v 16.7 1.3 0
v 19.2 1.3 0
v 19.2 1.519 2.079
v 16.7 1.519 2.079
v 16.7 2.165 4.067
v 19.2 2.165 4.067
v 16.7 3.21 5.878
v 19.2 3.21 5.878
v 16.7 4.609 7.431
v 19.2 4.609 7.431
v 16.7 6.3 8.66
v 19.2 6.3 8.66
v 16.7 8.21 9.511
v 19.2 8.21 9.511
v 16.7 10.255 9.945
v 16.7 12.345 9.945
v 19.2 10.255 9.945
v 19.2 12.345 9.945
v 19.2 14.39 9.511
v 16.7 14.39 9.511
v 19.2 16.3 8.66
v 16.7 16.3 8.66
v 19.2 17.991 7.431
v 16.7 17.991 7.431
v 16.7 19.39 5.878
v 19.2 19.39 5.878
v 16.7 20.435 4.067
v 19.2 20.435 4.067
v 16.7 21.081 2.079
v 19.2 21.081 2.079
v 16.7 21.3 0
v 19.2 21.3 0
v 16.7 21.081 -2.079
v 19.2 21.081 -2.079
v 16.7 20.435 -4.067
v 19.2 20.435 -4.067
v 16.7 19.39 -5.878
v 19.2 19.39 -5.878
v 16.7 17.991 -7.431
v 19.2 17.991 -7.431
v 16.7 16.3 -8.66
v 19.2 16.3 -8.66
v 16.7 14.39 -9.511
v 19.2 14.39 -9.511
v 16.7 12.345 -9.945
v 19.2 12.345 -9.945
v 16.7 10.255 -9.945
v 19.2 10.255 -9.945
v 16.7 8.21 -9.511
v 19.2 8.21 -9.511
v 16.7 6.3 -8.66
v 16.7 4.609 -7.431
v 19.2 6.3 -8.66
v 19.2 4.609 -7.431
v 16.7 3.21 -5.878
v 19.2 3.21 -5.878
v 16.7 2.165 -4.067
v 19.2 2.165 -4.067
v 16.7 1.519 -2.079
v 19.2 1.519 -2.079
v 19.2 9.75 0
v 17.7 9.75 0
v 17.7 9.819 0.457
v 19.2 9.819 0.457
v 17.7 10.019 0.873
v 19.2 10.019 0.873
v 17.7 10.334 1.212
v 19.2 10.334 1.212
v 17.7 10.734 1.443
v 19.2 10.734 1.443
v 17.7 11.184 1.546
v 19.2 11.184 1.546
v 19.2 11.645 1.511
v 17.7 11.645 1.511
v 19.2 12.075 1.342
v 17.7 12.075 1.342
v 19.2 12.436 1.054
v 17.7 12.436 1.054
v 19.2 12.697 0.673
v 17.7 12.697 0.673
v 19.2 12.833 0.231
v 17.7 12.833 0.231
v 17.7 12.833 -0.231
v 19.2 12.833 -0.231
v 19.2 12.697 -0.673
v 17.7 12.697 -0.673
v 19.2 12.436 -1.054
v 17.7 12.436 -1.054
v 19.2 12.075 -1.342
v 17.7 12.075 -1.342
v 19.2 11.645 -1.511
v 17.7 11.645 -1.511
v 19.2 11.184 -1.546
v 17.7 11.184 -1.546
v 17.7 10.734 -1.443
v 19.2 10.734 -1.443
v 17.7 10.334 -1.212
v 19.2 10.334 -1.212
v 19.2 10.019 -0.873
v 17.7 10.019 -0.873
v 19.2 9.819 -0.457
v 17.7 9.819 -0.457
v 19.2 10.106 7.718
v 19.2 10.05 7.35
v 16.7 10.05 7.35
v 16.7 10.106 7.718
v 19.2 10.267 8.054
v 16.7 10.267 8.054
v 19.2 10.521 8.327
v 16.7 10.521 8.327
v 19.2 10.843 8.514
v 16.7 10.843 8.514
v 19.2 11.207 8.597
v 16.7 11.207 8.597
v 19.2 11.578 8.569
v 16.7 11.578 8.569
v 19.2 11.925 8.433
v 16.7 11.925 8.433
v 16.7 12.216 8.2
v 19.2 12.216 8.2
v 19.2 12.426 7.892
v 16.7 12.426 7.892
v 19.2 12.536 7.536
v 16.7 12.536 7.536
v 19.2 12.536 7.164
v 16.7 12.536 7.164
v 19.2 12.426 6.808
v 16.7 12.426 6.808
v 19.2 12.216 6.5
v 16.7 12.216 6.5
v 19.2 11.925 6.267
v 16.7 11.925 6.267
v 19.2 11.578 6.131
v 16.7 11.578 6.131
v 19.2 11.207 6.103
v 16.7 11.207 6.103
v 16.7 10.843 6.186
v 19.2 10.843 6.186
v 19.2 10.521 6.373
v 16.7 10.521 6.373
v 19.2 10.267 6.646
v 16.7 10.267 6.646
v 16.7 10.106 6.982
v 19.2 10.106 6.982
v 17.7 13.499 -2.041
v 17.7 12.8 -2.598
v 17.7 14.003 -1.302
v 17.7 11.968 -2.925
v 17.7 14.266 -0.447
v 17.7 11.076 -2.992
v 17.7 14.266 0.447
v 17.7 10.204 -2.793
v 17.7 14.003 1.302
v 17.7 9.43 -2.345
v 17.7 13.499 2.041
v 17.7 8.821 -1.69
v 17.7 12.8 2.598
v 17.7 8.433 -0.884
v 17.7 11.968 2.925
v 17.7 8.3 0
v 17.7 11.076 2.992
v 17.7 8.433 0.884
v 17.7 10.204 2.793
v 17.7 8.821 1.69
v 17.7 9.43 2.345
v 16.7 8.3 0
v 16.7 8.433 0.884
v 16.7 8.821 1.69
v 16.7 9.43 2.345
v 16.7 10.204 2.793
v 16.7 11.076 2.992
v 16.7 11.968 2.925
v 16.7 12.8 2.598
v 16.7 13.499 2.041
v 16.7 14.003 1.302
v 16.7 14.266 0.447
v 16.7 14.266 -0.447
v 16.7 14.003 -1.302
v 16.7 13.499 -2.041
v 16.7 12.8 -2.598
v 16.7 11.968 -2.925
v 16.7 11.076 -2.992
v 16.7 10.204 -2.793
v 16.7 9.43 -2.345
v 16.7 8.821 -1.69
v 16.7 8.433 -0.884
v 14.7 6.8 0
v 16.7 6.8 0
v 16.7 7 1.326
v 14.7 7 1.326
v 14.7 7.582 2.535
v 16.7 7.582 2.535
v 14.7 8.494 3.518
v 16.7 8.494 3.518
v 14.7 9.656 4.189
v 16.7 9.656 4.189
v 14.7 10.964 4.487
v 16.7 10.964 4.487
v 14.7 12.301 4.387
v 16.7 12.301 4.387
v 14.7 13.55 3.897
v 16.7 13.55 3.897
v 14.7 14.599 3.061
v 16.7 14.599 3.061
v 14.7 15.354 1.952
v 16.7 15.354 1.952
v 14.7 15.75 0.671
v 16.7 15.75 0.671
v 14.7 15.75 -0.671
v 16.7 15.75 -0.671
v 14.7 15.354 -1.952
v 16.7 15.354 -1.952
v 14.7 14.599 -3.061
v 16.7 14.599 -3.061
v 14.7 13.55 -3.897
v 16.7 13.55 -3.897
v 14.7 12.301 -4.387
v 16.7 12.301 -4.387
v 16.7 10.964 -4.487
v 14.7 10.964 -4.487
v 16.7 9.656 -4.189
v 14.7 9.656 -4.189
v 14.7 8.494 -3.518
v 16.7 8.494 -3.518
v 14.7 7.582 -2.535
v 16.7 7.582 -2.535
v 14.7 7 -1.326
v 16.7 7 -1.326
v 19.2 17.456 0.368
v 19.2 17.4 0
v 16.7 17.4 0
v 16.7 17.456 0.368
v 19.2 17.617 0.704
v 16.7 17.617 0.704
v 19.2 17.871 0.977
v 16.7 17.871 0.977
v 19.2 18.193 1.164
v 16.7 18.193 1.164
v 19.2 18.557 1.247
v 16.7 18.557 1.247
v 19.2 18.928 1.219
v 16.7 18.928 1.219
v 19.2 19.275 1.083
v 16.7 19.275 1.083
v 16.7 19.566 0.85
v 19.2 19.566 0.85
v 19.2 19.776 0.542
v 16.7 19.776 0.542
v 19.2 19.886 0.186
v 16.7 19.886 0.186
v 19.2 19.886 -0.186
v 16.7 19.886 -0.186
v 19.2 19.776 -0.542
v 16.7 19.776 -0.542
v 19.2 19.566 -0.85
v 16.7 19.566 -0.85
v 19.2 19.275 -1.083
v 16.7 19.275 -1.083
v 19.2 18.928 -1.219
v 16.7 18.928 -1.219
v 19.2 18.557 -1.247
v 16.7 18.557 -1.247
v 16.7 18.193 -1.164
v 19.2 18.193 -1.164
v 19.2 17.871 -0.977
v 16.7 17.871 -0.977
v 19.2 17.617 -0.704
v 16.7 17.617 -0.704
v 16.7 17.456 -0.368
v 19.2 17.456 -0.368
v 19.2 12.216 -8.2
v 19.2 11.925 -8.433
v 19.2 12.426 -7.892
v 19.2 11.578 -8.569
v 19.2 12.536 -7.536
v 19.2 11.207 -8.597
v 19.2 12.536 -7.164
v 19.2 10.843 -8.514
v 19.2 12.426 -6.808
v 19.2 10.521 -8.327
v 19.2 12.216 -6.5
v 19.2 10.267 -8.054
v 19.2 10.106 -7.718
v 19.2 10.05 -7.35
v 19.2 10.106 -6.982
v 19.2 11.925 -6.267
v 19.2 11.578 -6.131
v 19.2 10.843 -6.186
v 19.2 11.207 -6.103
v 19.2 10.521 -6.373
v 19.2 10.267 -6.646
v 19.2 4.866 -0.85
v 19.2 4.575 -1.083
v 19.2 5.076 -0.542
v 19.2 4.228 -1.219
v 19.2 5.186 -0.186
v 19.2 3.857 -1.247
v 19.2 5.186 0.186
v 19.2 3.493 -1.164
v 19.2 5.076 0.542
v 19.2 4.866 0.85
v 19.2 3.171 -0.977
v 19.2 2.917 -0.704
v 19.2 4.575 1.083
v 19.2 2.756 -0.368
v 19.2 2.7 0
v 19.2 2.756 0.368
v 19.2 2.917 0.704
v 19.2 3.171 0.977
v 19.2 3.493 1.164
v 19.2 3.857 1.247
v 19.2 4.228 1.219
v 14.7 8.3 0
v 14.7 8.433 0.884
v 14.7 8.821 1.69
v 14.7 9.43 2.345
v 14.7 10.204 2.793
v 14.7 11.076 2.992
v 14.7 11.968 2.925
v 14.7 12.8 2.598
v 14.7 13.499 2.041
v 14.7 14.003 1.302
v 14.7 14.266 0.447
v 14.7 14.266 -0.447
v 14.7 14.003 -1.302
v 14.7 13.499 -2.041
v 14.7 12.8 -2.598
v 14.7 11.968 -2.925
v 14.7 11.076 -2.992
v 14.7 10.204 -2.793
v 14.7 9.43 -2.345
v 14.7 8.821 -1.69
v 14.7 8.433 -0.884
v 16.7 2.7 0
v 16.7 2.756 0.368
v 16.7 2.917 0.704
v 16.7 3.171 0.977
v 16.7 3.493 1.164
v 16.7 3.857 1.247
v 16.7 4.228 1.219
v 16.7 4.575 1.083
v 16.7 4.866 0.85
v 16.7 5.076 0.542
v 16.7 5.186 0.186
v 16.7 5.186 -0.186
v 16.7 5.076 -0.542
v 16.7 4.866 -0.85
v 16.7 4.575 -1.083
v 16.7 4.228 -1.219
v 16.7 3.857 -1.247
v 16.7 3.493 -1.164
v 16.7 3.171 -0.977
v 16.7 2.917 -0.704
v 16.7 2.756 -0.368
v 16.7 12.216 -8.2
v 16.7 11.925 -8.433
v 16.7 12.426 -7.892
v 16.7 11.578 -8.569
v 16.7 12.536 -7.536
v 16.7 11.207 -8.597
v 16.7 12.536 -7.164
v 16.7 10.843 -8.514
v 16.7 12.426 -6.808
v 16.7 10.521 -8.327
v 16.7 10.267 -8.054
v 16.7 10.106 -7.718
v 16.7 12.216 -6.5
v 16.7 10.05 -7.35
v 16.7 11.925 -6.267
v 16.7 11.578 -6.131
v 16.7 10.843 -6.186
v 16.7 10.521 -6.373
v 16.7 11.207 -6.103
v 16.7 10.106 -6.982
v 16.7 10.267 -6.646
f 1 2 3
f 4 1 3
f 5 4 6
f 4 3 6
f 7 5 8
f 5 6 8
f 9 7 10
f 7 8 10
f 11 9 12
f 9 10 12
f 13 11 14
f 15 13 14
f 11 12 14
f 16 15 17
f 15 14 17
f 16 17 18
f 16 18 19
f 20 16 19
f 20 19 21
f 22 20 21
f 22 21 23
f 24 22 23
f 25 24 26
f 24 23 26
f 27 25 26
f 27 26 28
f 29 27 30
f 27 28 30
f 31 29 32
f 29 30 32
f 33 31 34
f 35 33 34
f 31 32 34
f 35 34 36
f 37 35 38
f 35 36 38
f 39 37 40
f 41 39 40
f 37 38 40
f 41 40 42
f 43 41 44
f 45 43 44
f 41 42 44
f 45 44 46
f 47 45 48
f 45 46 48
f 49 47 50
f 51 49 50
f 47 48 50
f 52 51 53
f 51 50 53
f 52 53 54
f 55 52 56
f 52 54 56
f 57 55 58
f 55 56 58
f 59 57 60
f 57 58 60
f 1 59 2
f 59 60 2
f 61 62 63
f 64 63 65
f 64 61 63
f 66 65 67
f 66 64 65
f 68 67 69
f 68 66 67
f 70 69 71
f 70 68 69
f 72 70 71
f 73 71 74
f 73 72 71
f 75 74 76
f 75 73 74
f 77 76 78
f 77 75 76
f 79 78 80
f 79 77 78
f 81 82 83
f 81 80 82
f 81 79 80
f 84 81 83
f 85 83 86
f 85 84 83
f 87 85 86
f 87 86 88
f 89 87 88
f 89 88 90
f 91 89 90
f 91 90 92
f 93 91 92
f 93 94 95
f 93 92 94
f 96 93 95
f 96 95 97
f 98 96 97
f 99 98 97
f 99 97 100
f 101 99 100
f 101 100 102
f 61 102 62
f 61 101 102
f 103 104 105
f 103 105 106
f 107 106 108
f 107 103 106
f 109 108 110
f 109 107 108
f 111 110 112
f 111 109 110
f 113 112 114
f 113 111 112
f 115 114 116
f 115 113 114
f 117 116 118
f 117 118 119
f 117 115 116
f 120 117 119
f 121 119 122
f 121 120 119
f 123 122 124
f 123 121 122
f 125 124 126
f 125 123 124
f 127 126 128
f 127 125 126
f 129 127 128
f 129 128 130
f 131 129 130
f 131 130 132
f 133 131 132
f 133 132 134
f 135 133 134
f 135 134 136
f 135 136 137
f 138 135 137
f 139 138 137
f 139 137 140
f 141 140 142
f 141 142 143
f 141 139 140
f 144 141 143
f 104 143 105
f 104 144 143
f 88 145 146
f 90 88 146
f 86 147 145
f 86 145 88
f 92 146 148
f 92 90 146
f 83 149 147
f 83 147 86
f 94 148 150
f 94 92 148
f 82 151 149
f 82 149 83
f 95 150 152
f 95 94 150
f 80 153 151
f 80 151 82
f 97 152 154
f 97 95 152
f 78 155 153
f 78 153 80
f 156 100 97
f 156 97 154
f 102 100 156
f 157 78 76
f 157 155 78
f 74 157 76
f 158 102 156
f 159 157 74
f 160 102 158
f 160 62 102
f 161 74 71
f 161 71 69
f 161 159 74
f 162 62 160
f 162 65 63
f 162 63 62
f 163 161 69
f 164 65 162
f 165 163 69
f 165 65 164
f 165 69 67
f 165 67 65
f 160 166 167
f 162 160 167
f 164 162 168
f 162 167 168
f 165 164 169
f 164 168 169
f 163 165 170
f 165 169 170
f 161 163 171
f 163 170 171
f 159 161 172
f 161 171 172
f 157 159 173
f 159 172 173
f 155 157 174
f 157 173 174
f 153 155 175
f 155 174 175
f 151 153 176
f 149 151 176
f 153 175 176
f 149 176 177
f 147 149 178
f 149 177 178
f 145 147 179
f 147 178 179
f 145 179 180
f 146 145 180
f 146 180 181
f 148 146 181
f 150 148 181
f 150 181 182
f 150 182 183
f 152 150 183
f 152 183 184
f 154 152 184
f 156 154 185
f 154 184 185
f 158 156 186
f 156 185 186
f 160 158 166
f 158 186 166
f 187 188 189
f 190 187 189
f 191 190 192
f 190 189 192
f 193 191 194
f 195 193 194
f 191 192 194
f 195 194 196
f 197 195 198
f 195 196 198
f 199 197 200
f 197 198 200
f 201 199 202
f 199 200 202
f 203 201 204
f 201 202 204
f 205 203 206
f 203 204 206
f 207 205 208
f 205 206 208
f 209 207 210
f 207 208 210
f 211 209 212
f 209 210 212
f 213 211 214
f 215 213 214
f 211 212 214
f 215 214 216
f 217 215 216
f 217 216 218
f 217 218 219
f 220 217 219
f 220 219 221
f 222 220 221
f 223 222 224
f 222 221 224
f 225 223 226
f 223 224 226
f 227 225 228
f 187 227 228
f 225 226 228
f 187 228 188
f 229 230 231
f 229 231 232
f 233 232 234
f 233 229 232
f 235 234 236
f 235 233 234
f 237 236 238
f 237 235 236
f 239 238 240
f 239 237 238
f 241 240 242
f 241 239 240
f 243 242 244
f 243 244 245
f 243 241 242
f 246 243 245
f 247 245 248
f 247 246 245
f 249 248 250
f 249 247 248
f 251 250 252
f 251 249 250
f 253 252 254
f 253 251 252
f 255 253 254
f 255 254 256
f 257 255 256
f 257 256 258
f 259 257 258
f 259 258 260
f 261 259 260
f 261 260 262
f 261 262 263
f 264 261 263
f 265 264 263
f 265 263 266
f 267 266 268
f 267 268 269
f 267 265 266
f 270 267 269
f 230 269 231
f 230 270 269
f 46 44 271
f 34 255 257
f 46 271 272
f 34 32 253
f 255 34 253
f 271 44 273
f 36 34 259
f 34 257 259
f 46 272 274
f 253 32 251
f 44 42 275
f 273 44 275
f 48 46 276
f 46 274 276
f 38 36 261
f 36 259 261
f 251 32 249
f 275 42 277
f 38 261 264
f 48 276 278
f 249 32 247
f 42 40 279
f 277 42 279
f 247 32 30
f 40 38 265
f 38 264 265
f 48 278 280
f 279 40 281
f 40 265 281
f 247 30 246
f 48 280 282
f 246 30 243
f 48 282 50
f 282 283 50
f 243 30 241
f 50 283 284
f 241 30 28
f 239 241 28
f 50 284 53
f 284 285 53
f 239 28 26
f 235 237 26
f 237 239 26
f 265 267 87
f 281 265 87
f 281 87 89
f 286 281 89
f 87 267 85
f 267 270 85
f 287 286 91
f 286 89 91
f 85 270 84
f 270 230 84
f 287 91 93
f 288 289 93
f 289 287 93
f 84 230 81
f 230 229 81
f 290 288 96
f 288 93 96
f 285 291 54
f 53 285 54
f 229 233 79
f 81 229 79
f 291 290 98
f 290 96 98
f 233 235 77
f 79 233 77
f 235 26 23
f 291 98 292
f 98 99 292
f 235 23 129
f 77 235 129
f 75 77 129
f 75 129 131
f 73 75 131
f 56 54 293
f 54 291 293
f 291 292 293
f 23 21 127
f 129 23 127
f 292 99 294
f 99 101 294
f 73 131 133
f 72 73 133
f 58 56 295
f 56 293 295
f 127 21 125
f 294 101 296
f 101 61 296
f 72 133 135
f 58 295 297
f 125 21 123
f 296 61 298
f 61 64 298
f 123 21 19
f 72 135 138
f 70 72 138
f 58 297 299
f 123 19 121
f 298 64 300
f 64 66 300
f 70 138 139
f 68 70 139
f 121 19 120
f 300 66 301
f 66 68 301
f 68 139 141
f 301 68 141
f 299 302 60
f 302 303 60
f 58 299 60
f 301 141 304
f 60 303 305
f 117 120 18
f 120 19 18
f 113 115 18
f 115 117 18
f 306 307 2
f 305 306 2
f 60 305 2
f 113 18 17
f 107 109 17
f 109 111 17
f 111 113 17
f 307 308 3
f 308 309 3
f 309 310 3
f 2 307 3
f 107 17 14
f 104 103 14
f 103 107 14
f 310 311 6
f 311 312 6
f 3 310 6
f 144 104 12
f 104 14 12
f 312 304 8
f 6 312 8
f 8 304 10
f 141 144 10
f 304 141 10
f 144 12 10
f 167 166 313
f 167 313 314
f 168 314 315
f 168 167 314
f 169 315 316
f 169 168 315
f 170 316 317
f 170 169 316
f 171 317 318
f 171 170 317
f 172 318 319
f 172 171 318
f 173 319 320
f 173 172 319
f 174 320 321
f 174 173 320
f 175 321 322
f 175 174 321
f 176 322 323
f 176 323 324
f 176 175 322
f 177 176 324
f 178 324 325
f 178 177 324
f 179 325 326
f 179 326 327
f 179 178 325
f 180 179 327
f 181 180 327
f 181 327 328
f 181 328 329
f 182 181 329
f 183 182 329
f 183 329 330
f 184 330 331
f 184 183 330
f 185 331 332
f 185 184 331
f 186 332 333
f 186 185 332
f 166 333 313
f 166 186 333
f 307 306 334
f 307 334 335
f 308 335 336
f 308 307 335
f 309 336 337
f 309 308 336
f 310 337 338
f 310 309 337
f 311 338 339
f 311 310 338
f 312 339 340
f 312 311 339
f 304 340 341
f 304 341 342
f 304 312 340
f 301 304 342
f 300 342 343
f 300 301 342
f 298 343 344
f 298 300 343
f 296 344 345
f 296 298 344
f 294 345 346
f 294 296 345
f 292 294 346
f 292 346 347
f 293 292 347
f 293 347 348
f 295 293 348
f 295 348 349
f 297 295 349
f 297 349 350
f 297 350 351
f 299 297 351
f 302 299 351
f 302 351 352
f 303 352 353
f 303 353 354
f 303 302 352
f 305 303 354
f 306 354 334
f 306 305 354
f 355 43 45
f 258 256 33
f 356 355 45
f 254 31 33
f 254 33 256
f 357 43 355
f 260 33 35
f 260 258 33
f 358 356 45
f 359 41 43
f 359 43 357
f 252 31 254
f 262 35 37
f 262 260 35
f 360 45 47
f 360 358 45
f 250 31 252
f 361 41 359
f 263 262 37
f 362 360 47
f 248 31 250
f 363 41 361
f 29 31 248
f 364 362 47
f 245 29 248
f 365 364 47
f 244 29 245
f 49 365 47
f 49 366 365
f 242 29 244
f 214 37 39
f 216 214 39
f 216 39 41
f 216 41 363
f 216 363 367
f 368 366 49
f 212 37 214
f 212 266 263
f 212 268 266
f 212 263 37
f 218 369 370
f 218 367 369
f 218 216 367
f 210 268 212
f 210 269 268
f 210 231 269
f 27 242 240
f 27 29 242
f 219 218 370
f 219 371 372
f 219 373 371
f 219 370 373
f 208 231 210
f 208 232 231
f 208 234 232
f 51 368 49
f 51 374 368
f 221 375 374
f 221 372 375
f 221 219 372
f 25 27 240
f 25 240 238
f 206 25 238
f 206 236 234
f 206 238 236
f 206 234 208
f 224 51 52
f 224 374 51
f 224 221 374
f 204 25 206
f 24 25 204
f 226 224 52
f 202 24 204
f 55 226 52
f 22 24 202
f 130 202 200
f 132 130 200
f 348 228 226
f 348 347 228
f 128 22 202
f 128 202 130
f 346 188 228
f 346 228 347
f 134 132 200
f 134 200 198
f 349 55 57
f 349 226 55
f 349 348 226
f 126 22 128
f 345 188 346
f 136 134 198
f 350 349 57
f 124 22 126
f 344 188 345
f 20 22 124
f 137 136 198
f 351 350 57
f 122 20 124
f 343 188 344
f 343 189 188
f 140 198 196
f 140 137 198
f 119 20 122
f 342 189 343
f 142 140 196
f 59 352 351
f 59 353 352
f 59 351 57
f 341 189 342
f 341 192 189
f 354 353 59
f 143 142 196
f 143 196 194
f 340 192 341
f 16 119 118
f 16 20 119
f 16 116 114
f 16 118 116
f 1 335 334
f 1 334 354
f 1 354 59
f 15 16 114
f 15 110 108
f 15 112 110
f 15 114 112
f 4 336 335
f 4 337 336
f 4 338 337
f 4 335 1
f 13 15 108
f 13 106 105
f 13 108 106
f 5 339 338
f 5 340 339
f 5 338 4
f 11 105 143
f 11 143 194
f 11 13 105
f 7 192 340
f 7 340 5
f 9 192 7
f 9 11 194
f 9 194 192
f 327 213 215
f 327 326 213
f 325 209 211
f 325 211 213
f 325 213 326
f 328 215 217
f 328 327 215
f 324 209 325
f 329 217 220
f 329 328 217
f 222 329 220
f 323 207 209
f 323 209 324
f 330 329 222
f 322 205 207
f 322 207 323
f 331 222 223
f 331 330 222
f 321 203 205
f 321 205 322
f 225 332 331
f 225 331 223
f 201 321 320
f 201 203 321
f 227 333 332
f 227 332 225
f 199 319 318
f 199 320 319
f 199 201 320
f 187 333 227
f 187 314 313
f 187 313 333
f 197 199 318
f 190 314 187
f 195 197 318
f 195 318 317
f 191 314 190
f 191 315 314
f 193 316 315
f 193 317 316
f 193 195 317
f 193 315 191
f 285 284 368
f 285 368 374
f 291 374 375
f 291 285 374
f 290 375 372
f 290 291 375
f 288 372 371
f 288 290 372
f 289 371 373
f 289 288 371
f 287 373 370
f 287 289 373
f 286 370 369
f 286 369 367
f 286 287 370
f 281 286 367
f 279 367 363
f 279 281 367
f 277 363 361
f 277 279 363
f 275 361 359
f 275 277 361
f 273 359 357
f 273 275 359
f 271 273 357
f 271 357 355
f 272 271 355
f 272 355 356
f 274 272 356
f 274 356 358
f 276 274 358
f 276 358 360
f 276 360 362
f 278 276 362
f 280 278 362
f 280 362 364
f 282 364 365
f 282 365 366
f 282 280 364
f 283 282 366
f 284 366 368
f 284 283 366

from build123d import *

# Parameters (mm, degrees)
SKETCH030_R             = 10
SKETCH030_R_2           = 1.55
SKETCH030_R_3           = 1.25
PAD027_DEPTH            = 2.5
SKETCH031_R             = 4.5
SKETCH031_R_2           = 3
PAD028_DEPTH            = 2
SKETCH032_R             = 3
POCKET009_DEPTH         = 1
BODY011_PLACEMENT_ANGLE = 180


with BuildPart() as part:
    # Sketch030 → Pad027 (new body)
    with BuildSketch(Plane.YZ):
        Circle(SKETCH030_R)
        Circle(SKETCH030_R_2, mode=Mode.SUBTRACT)
        with Locations((-7.35, 0)):
            Circle(SKETCH030_R_3, mode=Mode.SUBTRACT)
        with Locations((0, -7.35)):
            Circle(SKETCH030_R_3, mode=Mode.SUBTRACT)
        with Locations((7.35, 0)):
            Circle(SKETCH030_R_3, mode=Mode.SUBTRACT)
        with Locations((0, 7.35)):
            Circle(SKETCH030_R_3, mode=Mode.SUBTRACT)
    extrude(amount=PAD027_DEPTH)

    # Sketch031 (on Face8 of Pad027) → Pad028 (join)
    with BuildSketch(Plane.YZ.offset(2.5)):
        Circle(SKETCH031_R)
        Circle(SKETCH031_R_2, mode=Mode.SUBTRACT)
    extrude(amount=PAD028_DEPTH)

    # Sketch032 (on Face10 of Pad028) → Pocket009 (cut)
    with BuildSketch(Plane.YZ.offset(2.5)):
        Circle(SKETCH032_R)
    extrude(amount=-POCKET009_DEPTH, mode=Mode.SUBTRACT)


with BuildPart() as part_1:
    # Body011 placement: moved
    add(part.part.moved(Location((19.2, 11.3, 0))).rotate(Axis((19.2, 11.3, 0), (0, 0, 1)), BODY011_PLACEMENT_ANGLE))


solid = part_1.part
